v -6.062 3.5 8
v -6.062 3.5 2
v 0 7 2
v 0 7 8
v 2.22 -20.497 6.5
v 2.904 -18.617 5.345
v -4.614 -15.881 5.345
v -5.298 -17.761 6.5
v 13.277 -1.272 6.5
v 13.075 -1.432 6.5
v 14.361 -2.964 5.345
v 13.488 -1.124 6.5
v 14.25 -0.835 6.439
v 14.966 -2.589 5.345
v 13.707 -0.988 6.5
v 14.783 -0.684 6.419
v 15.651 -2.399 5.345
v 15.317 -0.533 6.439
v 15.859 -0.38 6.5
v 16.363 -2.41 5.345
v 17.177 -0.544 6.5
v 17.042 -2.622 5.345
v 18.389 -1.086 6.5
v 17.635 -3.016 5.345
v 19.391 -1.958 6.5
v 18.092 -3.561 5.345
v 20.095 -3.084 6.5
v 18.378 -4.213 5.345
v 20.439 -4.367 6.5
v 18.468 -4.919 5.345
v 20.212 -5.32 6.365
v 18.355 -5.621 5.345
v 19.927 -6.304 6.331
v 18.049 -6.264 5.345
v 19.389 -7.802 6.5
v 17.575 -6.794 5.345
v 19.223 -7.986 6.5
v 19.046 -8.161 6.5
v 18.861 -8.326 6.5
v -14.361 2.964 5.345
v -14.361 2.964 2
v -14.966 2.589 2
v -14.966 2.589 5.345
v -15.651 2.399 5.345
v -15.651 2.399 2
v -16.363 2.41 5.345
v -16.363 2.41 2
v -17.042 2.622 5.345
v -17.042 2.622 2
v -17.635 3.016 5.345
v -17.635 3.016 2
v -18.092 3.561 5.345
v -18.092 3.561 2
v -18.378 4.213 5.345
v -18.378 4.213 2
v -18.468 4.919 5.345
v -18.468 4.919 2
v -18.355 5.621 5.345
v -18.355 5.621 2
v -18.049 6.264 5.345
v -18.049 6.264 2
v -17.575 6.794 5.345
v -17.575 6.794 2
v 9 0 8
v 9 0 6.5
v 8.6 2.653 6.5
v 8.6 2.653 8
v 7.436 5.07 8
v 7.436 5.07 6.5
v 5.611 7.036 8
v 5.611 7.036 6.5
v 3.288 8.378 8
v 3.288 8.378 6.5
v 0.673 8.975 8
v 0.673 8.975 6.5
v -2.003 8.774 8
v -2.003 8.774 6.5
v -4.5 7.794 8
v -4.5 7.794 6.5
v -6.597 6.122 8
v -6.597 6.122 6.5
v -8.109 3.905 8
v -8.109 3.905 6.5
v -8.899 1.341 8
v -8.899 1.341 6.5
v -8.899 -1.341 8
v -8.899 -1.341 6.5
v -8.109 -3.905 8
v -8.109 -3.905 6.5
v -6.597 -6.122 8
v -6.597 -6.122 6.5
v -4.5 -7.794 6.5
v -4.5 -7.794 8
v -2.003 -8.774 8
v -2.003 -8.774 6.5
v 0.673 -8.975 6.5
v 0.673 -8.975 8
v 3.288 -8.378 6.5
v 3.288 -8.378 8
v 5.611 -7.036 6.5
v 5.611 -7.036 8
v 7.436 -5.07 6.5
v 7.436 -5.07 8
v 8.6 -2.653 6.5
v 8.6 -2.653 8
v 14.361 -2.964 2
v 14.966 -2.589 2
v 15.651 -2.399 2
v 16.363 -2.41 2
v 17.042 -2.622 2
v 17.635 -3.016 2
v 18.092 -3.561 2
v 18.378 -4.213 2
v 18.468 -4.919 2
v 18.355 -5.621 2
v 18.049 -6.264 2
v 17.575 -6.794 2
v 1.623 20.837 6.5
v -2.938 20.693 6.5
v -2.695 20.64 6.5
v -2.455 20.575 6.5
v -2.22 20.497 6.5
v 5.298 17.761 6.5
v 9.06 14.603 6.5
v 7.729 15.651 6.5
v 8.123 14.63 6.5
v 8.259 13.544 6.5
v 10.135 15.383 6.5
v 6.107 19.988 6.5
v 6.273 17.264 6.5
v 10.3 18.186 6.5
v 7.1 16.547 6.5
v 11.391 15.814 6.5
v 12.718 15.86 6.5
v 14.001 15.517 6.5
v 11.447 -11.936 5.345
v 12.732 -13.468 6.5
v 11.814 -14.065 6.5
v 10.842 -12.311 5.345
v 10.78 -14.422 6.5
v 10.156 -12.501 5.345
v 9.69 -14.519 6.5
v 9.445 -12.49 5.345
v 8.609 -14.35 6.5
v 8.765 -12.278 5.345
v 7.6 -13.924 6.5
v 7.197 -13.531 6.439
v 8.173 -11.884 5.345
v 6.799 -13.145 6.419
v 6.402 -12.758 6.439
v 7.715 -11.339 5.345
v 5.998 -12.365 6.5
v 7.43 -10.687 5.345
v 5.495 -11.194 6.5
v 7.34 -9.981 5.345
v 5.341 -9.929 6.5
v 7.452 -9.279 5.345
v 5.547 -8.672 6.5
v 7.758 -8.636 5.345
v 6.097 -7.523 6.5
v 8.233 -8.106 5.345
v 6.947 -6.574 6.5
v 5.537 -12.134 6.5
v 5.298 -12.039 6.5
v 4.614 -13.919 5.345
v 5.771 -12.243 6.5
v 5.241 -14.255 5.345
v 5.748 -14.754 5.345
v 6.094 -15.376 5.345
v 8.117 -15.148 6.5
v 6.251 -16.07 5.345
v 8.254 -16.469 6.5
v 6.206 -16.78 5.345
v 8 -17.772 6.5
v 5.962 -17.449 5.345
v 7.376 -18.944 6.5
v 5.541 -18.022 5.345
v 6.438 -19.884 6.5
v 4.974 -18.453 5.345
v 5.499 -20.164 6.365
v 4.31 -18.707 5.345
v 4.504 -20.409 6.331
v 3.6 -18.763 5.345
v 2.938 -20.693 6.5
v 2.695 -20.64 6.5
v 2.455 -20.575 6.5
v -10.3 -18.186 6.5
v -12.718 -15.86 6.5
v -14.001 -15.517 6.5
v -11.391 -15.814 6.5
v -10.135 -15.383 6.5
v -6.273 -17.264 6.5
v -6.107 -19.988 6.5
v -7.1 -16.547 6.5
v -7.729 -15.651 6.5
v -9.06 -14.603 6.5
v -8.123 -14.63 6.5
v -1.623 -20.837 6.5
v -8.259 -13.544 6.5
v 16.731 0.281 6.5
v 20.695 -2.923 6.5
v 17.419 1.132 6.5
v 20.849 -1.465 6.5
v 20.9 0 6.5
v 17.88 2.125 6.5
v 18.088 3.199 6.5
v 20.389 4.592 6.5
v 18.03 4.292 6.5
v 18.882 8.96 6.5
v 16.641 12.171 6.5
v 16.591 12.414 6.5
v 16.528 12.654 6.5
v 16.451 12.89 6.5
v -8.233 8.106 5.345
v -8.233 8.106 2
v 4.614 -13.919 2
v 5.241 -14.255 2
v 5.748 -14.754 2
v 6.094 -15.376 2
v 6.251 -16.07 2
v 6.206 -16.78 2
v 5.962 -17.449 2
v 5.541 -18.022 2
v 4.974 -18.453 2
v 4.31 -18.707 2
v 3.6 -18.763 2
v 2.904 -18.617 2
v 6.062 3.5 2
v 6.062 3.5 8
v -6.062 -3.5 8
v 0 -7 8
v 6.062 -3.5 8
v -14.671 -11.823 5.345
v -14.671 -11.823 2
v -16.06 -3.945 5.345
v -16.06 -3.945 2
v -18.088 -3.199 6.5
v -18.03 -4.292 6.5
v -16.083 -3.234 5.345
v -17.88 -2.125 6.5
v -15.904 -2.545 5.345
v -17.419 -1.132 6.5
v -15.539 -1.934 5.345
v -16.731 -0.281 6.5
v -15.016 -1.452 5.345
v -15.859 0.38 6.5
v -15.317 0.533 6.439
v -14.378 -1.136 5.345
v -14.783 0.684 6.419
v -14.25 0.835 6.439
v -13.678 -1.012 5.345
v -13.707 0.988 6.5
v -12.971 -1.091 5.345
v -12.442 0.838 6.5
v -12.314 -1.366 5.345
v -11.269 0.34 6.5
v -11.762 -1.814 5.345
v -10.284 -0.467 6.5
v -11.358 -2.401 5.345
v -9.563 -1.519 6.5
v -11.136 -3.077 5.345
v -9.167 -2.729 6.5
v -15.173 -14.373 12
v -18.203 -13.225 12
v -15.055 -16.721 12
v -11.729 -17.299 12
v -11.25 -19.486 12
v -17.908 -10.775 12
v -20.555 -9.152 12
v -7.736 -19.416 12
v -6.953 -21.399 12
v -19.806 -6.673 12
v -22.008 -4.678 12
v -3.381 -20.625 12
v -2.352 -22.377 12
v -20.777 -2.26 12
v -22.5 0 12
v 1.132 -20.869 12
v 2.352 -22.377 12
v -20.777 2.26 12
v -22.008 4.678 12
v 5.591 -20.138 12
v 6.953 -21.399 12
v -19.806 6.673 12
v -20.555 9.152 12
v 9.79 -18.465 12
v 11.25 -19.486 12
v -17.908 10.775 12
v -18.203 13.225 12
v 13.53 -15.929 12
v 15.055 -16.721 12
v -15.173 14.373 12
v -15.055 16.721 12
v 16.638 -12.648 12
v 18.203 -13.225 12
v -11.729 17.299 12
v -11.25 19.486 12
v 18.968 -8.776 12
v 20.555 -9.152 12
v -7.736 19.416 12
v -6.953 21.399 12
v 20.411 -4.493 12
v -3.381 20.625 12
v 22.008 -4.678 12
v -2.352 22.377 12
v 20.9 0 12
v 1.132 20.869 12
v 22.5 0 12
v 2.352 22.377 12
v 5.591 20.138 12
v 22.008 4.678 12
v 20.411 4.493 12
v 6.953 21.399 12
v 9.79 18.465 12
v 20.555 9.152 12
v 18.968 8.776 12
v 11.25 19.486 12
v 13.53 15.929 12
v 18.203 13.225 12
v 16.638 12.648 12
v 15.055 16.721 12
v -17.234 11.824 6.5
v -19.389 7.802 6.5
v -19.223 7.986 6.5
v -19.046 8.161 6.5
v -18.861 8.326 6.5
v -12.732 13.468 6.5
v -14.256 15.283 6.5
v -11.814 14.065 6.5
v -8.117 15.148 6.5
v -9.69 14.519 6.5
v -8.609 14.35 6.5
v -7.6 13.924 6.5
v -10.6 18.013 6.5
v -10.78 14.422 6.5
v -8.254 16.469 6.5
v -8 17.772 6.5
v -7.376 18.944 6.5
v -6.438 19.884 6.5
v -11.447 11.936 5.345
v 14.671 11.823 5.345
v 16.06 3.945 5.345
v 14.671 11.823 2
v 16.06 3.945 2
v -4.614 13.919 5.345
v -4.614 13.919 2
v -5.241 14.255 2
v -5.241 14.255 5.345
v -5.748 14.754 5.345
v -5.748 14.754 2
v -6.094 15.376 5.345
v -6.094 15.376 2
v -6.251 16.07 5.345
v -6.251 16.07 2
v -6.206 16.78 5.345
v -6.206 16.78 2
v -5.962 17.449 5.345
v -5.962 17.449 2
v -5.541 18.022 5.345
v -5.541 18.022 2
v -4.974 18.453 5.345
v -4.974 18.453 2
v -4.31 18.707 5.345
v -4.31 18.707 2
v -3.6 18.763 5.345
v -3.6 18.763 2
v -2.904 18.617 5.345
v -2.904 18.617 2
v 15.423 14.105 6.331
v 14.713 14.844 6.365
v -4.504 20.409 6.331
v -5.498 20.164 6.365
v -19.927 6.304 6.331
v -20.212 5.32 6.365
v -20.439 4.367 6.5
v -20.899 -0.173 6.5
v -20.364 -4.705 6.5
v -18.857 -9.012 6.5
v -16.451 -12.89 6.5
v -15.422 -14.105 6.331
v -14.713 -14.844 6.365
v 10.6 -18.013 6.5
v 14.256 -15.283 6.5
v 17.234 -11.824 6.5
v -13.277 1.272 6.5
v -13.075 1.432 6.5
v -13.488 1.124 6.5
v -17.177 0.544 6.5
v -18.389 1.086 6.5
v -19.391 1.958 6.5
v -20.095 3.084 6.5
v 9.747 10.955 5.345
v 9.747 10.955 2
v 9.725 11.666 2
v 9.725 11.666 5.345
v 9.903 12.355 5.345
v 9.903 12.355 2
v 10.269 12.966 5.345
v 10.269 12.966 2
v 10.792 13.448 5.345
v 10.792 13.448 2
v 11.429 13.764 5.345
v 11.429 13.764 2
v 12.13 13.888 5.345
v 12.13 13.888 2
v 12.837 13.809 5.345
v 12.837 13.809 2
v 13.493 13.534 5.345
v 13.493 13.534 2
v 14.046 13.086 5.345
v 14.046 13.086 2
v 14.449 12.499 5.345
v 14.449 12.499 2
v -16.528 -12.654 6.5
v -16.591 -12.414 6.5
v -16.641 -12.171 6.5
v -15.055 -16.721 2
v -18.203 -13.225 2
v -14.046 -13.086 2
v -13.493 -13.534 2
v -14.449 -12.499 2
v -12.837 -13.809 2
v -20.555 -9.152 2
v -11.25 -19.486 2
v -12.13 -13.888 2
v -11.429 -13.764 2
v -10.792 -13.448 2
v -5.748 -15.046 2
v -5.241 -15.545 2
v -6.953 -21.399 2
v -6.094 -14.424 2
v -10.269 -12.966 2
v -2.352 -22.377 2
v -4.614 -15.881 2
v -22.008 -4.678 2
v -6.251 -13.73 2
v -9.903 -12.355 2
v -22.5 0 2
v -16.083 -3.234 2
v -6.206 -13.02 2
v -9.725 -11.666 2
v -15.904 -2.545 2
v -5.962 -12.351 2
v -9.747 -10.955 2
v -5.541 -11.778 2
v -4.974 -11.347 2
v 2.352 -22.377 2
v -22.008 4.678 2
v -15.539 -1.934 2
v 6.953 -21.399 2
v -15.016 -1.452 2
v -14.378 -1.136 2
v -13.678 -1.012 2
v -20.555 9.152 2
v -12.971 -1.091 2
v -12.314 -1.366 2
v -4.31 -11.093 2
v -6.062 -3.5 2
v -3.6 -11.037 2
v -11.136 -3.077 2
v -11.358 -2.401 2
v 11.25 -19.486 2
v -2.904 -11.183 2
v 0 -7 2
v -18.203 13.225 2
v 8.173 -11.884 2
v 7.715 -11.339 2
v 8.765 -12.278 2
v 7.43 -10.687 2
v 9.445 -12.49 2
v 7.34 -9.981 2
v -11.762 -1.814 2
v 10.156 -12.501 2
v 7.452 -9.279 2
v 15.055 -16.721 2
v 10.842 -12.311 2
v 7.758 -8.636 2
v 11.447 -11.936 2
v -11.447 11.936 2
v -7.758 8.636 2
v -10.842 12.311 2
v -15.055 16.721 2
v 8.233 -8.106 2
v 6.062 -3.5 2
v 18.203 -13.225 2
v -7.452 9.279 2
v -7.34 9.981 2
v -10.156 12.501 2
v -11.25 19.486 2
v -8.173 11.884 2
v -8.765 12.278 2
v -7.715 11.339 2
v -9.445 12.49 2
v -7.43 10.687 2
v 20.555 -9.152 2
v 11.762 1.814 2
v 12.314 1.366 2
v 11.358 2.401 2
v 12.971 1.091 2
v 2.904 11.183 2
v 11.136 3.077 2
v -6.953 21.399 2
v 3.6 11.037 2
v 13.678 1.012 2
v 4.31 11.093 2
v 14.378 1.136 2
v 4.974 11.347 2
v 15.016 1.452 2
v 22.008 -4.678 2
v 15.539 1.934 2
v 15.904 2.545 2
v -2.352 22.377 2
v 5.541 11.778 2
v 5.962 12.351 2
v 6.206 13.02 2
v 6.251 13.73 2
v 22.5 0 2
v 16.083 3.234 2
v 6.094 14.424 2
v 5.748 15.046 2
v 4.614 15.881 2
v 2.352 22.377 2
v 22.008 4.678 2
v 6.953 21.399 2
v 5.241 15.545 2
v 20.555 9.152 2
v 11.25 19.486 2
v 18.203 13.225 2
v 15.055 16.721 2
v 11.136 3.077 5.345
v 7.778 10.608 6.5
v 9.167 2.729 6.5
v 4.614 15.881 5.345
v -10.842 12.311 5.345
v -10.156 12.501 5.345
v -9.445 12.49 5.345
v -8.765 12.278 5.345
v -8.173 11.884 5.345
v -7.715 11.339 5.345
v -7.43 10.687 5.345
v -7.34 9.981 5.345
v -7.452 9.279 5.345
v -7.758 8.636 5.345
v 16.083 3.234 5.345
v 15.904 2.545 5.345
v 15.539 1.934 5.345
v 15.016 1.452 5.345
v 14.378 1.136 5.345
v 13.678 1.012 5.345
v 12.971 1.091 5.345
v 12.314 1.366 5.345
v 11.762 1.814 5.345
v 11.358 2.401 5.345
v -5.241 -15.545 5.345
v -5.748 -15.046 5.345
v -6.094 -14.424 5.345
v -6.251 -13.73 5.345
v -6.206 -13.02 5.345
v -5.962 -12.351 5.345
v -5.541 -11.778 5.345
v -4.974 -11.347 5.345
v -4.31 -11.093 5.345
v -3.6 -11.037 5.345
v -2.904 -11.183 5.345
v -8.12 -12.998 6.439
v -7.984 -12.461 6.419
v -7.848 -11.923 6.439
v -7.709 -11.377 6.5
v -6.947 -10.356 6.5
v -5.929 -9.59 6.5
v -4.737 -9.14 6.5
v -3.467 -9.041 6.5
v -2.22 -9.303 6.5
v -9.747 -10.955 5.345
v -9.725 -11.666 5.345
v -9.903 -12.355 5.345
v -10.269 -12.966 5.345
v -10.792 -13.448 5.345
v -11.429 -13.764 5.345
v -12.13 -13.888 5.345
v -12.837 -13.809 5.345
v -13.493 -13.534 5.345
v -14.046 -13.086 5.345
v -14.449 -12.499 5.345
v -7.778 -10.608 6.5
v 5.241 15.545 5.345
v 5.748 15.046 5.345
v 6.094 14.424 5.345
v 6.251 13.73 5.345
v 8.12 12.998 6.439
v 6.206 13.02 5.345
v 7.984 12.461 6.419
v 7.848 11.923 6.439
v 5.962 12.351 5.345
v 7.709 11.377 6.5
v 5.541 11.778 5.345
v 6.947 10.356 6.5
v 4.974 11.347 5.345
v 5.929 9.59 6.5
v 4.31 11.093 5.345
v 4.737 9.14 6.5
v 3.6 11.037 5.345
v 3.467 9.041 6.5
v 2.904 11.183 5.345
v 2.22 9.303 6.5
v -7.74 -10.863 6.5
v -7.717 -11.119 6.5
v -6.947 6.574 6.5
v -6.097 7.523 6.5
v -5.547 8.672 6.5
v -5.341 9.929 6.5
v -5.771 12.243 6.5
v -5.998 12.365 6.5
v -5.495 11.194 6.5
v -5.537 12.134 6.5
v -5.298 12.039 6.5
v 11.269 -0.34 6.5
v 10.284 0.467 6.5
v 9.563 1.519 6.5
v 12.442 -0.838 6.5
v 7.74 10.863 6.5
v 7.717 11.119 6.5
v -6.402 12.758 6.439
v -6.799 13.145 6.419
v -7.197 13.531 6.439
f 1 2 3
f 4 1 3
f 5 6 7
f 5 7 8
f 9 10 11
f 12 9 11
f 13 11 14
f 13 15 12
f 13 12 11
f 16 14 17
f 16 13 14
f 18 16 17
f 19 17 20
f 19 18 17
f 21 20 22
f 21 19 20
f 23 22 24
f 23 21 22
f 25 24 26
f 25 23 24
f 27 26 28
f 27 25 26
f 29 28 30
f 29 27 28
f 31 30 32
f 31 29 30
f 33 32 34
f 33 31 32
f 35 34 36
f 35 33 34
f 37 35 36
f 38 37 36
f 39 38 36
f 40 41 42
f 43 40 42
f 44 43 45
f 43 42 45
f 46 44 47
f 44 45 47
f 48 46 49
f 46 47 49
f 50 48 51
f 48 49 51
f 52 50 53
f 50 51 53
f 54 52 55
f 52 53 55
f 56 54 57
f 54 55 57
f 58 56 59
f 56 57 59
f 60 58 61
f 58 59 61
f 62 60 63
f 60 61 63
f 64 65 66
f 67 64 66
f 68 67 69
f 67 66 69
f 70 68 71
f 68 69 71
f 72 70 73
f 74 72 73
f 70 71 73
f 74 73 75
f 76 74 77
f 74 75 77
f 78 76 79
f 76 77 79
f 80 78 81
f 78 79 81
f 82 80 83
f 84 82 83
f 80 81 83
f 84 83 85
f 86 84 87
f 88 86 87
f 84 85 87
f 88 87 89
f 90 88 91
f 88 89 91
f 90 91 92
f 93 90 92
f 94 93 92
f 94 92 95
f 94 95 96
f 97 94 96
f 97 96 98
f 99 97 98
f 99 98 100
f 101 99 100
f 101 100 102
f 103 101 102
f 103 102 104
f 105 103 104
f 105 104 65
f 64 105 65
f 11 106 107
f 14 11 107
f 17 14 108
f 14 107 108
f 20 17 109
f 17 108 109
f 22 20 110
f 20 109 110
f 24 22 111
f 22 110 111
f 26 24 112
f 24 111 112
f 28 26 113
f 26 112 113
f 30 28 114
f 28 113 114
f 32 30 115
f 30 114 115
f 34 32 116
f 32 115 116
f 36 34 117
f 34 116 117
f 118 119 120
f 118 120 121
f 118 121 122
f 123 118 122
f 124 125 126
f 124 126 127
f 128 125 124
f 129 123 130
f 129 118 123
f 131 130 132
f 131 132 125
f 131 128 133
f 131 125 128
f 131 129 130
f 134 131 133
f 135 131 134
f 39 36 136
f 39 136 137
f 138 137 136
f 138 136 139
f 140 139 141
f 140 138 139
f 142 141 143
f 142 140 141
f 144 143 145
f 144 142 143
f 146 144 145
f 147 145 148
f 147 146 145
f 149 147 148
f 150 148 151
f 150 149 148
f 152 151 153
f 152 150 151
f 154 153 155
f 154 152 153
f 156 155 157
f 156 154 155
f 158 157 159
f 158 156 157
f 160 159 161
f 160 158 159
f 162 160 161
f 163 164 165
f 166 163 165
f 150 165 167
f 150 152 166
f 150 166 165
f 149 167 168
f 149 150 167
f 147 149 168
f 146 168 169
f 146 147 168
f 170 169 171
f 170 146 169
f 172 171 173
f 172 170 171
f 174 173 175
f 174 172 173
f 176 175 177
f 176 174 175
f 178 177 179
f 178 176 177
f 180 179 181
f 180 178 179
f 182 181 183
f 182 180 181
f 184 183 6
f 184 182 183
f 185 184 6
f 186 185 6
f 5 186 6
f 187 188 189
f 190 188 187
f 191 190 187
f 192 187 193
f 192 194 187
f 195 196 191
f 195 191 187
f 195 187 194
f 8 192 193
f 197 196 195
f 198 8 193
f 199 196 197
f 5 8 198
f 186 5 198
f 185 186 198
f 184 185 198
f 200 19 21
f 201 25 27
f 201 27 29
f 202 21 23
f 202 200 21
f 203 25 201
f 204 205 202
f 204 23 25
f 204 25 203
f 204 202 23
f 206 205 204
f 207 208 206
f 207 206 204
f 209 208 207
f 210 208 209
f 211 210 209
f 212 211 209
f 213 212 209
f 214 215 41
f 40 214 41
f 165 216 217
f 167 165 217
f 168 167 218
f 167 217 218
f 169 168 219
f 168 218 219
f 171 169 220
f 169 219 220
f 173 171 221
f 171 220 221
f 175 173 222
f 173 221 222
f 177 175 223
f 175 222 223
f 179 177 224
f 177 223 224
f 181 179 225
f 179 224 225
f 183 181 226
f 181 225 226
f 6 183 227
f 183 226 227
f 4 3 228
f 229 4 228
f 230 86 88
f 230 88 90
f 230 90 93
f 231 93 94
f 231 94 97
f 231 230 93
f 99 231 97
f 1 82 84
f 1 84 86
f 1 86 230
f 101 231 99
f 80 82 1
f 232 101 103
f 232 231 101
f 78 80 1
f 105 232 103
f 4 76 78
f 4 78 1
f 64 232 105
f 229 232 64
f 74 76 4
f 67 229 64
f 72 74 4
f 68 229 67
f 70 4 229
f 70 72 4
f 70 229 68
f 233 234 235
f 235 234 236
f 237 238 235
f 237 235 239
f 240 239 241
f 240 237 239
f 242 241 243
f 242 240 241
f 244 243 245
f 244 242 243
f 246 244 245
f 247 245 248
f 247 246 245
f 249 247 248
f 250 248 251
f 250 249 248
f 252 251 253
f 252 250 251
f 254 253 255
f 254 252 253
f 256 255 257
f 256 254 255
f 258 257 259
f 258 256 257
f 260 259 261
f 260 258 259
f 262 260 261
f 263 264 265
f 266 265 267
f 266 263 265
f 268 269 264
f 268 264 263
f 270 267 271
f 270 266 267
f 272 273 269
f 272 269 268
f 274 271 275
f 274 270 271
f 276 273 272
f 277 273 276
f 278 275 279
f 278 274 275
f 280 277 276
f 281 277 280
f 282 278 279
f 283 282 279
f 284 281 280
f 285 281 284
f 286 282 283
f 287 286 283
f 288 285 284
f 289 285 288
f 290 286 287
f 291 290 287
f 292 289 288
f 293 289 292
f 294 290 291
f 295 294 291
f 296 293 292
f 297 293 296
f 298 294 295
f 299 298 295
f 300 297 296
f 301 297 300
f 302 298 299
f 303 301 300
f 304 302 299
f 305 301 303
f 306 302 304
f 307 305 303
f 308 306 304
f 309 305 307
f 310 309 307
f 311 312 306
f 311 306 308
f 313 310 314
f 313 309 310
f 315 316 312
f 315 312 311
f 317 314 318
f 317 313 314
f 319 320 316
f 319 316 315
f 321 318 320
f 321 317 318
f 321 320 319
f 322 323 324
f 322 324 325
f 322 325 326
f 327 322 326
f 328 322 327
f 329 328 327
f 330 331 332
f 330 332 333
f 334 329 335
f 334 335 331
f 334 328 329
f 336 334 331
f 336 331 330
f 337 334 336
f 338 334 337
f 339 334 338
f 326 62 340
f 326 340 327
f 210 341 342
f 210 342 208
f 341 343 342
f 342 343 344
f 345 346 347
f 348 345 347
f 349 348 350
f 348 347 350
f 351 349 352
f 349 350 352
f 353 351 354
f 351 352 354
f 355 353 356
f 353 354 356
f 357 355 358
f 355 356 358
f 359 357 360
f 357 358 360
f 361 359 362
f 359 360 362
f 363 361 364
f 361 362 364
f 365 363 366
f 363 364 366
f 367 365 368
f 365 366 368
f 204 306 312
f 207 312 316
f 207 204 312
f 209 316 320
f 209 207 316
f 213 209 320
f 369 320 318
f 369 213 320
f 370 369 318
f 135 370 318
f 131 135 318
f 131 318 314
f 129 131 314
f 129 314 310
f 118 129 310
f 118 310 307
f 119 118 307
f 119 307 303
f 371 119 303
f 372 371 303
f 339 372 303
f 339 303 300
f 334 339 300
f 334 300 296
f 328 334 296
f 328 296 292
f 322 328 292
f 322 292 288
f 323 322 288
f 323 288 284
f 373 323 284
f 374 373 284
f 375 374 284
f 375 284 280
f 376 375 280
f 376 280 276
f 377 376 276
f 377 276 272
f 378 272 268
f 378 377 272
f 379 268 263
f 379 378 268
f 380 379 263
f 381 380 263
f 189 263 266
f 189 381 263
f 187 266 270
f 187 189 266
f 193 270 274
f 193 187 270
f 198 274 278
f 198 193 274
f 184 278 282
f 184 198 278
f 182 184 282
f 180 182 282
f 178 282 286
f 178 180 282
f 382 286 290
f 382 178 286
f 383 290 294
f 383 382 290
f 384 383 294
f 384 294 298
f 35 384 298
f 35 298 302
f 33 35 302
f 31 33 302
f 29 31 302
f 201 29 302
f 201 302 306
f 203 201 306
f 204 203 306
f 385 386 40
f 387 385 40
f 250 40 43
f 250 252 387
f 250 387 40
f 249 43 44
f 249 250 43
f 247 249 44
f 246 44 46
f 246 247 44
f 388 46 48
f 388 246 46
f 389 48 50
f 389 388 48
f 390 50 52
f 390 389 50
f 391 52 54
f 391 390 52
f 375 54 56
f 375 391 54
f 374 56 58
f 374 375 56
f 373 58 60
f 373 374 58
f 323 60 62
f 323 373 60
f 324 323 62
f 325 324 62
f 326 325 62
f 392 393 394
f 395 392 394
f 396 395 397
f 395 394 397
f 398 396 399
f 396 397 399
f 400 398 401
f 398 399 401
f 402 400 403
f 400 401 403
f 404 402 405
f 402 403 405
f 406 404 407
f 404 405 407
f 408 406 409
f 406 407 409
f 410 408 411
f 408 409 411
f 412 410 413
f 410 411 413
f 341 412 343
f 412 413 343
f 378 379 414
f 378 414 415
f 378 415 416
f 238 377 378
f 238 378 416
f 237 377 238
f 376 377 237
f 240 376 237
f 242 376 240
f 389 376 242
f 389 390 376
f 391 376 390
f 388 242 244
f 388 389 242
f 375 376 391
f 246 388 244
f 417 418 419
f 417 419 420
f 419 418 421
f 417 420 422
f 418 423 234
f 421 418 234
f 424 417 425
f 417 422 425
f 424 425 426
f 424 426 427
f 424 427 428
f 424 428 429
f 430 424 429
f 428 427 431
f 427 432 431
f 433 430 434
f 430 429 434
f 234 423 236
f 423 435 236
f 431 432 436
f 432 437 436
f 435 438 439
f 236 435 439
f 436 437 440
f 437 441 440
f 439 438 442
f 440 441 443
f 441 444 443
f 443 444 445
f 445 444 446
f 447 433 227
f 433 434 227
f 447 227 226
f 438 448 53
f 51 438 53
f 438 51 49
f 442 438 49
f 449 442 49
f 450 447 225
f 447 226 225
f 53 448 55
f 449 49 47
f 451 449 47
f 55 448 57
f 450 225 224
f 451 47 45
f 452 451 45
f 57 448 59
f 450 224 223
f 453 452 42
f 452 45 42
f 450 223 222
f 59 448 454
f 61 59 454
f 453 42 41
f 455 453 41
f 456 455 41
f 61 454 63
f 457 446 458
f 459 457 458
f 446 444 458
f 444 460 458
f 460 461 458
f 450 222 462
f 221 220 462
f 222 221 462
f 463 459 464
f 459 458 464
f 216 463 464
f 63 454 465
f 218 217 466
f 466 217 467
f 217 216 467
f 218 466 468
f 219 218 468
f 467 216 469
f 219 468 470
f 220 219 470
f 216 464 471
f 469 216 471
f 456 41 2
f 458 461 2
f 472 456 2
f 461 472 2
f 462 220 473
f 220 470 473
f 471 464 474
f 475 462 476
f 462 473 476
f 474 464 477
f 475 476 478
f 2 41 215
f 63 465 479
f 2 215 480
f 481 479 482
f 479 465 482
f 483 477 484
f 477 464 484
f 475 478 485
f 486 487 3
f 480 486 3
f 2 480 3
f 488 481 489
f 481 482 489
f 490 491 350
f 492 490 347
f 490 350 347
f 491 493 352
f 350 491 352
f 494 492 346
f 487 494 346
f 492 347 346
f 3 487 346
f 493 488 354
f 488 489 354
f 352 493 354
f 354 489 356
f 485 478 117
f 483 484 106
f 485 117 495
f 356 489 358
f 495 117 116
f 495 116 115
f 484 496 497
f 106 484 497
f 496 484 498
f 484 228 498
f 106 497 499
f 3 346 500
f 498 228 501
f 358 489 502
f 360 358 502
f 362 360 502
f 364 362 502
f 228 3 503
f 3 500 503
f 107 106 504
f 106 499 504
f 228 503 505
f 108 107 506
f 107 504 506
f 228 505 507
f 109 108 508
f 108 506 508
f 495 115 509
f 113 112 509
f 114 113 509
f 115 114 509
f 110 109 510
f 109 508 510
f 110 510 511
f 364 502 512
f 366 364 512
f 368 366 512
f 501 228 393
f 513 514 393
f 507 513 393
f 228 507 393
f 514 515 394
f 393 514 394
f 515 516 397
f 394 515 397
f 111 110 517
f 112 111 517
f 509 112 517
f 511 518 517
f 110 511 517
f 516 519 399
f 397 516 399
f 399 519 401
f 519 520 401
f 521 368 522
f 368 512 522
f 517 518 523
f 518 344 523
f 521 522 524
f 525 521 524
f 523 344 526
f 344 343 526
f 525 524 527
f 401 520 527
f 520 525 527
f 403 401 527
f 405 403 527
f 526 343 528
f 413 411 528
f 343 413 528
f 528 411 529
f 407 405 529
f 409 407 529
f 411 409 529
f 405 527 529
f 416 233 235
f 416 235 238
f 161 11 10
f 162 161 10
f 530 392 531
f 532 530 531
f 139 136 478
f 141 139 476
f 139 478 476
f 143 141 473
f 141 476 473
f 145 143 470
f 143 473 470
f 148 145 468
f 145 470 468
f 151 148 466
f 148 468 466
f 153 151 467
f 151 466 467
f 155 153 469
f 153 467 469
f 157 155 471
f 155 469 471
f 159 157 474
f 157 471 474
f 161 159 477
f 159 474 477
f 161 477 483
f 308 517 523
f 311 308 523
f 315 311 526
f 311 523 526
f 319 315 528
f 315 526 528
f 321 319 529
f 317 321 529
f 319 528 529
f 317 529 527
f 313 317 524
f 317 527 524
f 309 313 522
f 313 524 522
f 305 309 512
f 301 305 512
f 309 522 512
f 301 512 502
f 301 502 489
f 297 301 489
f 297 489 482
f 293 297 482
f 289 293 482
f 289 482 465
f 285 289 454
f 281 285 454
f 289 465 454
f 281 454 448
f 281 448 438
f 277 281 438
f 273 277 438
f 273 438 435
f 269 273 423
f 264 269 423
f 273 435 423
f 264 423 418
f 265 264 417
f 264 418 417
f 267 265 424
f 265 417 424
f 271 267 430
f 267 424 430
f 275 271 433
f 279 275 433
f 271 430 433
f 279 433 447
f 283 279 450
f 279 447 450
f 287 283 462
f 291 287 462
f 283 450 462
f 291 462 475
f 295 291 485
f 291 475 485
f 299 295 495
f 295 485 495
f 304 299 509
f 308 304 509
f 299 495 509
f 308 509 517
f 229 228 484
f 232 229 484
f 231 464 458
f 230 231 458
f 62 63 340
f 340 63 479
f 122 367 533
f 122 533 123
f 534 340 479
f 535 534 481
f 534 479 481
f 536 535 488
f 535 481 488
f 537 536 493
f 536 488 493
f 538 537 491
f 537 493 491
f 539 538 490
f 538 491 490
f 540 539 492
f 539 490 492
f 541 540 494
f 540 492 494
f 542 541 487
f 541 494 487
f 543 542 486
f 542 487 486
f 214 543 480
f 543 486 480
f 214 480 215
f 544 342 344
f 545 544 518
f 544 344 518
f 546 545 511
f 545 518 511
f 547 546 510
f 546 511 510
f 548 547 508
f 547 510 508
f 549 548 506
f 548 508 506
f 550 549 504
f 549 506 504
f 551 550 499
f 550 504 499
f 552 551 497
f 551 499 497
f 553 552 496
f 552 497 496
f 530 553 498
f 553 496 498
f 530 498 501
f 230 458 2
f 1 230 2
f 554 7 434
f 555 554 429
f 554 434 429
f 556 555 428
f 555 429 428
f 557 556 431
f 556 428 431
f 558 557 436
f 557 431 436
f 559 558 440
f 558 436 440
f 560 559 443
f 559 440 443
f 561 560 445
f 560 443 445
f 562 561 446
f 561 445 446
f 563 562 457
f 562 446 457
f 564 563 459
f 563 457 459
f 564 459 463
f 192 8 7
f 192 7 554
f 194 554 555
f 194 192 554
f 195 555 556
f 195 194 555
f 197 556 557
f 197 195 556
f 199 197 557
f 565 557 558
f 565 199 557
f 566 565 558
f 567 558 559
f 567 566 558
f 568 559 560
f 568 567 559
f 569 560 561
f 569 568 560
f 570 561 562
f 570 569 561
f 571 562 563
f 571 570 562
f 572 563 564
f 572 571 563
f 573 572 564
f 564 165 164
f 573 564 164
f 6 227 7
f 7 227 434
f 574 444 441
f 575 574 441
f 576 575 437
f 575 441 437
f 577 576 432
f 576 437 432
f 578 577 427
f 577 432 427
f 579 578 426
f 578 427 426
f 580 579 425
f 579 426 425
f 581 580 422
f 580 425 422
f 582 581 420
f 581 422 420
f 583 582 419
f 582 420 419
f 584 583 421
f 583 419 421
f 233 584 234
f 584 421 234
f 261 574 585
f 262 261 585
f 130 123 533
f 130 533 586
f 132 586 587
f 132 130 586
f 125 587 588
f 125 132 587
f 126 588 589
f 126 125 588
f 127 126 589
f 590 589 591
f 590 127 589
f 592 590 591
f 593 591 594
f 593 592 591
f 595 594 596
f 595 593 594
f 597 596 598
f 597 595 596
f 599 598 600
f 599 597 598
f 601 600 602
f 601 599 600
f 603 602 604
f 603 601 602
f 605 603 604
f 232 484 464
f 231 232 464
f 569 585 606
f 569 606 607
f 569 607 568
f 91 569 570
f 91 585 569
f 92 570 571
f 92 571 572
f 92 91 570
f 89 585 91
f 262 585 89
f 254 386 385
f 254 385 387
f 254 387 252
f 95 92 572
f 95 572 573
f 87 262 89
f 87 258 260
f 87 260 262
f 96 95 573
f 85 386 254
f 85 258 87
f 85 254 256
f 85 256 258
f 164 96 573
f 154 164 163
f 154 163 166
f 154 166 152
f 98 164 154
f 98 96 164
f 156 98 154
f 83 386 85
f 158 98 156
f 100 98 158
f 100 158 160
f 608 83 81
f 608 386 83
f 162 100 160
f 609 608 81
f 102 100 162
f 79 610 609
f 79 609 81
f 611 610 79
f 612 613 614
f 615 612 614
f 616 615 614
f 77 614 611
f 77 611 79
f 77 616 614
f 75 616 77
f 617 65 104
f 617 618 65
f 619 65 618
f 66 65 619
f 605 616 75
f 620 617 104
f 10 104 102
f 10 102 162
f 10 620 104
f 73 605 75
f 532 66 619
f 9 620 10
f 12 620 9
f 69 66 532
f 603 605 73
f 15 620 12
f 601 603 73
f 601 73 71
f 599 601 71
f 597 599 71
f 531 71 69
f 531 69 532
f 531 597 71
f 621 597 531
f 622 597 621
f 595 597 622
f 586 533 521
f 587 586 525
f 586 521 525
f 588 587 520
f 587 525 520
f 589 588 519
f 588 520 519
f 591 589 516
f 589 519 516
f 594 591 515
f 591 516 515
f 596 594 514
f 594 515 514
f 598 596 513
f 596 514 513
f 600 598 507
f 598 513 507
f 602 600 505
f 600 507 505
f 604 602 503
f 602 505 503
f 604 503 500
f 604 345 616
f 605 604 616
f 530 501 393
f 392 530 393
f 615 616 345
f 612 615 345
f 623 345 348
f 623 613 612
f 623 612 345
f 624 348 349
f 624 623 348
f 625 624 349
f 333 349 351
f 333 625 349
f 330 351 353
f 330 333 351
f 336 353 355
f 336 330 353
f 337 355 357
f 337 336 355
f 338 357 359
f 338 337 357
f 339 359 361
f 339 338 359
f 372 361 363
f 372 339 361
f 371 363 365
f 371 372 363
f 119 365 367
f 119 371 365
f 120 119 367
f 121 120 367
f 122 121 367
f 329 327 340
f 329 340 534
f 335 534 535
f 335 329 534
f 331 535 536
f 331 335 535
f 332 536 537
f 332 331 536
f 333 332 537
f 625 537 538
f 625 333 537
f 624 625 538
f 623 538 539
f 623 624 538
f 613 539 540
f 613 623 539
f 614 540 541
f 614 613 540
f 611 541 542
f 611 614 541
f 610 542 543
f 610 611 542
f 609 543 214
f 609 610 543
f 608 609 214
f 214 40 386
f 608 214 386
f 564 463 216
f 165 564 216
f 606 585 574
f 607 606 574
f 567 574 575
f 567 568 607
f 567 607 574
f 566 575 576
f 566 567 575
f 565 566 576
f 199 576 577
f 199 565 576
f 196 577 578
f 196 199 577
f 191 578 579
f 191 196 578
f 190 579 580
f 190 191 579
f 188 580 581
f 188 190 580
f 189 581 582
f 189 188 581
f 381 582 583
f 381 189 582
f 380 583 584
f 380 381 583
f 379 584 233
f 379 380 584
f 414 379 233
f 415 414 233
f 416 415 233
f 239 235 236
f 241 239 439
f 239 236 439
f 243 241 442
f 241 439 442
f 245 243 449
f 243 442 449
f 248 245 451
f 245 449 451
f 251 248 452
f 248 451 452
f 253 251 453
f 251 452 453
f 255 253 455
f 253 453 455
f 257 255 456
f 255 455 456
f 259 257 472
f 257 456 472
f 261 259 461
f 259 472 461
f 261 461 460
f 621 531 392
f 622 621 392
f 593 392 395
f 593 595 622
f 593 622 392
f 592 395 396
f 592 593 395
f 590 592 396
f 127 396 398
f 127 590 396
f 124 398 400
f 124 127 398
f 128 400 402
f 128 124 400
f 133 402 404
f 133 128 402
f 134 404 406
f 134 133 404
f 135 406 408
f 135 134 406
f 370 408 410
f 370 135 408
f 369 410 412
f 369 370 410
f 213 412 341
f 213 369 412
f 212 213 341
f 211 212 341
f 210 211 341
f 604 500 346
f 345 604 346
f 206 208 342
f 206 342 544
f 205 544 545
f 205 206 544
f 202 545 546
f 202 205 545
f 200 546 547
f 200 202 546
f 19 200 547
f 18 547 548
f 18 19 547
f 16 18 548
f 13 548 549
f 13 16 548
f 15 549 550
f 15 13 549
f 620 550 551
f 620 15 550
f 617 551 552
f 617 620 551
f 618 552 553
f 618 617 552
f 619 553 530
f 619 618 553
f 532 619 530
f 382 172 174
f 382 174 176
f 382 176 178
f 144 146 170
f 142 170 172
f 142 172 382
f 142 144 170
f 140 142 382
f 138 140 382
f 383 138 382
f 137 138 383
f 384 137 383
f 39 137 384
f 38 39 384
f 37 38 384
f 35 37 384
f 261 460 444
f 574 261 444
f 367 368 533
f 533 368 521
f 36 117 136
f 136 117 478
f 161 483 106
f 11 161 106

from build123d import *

# Parameters (mm, degrees)
F1_START     = 2
F0_R         = 20.9
F0_R_2       = 9
F1_DEPTH     = 4.5
F2_START     = 2
F0_R_3       = 8
F2_DEPTH     = 6
F3_START     = 2
F3_DEPTH     = 6
F4_START     = 2
F0_R_4       = 22.5
F4_DEPTH     = 10
F5_T1_DEPTH  = 8
F5_T3_DEPTH  = 8
F5_T5_DEPTH  = 8
F5_T7_DEPTH  = 8
F5_T9_DEPTH  = 8
F5_T11_DEPTH = 8
F5_T13_DEPTH = 8
F5_T15_DEPTH = 8
F5_T17_DEPTH = 8
F5_T19_DEPTH = 8
F5_T21_DEPTH = 8
F5_T23_DEPTH = 8
F5_T26_ANGLE = 180
F5_T30_ANGLE = 180
F5_S31_R     = 20.9
F5_T32_DEPTH = 7
F5_T34_ANGLE = 180
F5_T38_ANGLE = 180
F5_S39_R     = 20.9
F5_T40_DEPTH = 7
F5_T44_ANGLE = 180
F5_S45_R     = 20.9
F5_T46_DEPTH = 7
F5_T48_ANGLE = 180
F5_T52_ANGLE = 180
F5_S53_R     = 20.9
F5_T54_DEPTH = 7
F5_T56_ANGLE = 180
F5_T60_ANGLE = 180
F5_S61_R     = 20.9
F5_T62_DEPTH = 7
F5_T64_ANGLE = 180
F5_T66_ANGLE = 180
F5_T70_ANGLE = 180
F5_S71_R     = 20.9
F5_T72_DEPTH = 7


# Not quite as in the source:
# - a fillet or chamfer that OpenCascade refuses, or shapes differently, is made with other operations: its cross-section is extruded or revolved along the edge and cut away or added
# - a feature names something its author has since deleted; it is built from what else it names


with BuildPart() as f1:
    # F0 (on Top) → F1 (new body)
    with BuildSketch(Plane.XY.offset(F1_START)):
        Circle(F0_R)
        with BuildLine():
            ThreePointArc((4.6138208415, -13.9188490213), (6.1080020351, -17.1231309316), (2.9037201248, -18.6173121253))
            Line((2.9037201248, -18.6173121253), (-4.6138208415, -15.8811509787))
            ThreePointArc((-4.6138208415, -15.8811509787), (-6.1080020351, -12.6768690684), (-2.9037201248, -11.1826878747))
            Line((-2.9037201248, -11.1826878747), (4.6138208415, -13.9188490213))
        make_face(mode=Mode.SUBTRACT)
        with BuildLine():
            ThreePointArc((-9.7471664232, -10.9551105679), (-11.7750653616, -13.8512503946), (-14.6712051883, -11.8233514562))
            Line((-14.6712051883, -11.8233514562), (-16.0603906096, -3.9448894321))
            ThreePointArc((-16.0603906096, -3.9448894321), (-14.0324916712, -1.0487496054), (-11.1363518445, -3.0766485438))
            Line((-11.1363518445, -3.0766485438), (-9.7471664232, -10.9551105679))
        make_face(mode=Mode.SUBTRACT)
        with BuildLine():
            ThreePointArc((14.3609872646, -2.9637384535), (17.8830673967, -3.271880537), (17.5749253131, -6.7939606691))
            Line((17.5749253131, -6.7939606691), (11.4465697681, -11.9362615465))
            ThreePointArc((11.4465697681, -11.9362615465), (7.9244896361, -11.628119463), (8.2326317197, -8.1060393309))
            Line((8.2326317197, -8.1060393309), (14.3609872646, -2.9637384535))
        make_face(mode=Mode.SUBTRACT)
        with BuildLine():
            ThreePointArc((-14.3609872646, 2.9637384535), (-17.8830673967, 3.271880537), (-17.5749253131, 6.7939606691))
            Line((-17.5749253131, 6.7939606691), (-11.4465697681, 11.9362615465))
            ThreePointArc((-11.4465697681, 11.9362615465), (-7.9244896361, 11.628119463), (-8.2326317197, 8.1060393309))
            Line((-8.2326317197, 8.1060393309), (-14.3609872646, 2.9637384535))
        make_face(mode=Mode.SUBTRACT)
        Circle(F0_R_2, mode=Mode.SUBTRACT)
        with BuildLine():
            ThreePointArc((9.7471664232, 10.9551105679), (11.7750653616, 13.8512503946), (14.6712051883, 11.8233514562))
            Line((14.6712051883, 11.8233514562), (16.0603906096, 3.9448894321))
            ThreePointArc((16.0603906096, 3.9448894321), (14.0324916712, 1.0487496054), (11.1363518445, 3.0766485438))
            Line((11.1363518445, 3.0766485438), (9.7471664232, 10.9551105679))
        make_face(mode=Mode.SUBTRACT)
        with BuildLine():
            ThreePointArc((-4.6138208415, 13.9188490213), (-6.1080020351, 17.1231309316), (-2.9037201248, 18.6173121253))
            Line((-2.9037201248, 18.6173121253), (4.6138208415, 15.8811509787))
            ThreePointArc((4.6138208415, 15.8811509787), (6.1080020351, 12.6768690684), (2.9037201248, 11.1826878747))
            Line((2.9037201248, 11.1826878747), (-4.6138208415, 13.9188490213))
        make_face(mode=Mode.SUBTRACT)
    extrude(amount=F1_DEPTH)

    # F0 (on Top) → F2 (join)
    with BuildSketch(Plane.XY.offset(F2_START)):
        Circle(F0_R_2)
        Circle(F0_R_3, mode=Mode.SUBTRACT)
    extrude(amount=F2_DEPTH)

    # F0 (on Top) → F3 (join)
    with BuildSketch(Plane.XY.offset(F3_START)):
        Circle(F0_R_3)
        with BuildLine():
            ThreePointArc((6.0621778265, 3.5), (6.761480784, 1.8117333157), (7, 0))
            ThreePointArc((7, 0), (6.761480784, -1.8117333157), (6.0621778265, -3.5))
            ThreePointArc((6.0621778265, -3.5), (3.5, -6.0621778265), (0, -7))
            ThreePointArc((0, -7), (-3.5, -6.0621778265), (-6.0621778265, -3.5))
            ThreePointArc((-6.0621778265, -3.5), (-7, 0), (-6.0621778265, 3.5))
            ThreePointArc((-6.0621778265, 3.5), (-3.5, 6.0621778265), (0, 7))
            ThreePointArc((0, 7), (3.5, 6.0621778265), (6.0621778265, 3.5))
        make_face(mode=Mode.SUBTRACT)
        with BuildLine():
            Line((-6.0621778265, -3.5), (-6.0621778265, 3.5))
            ThreePointArc((-6.0621778265, 3.5), (-7, 0), (-6.0621778265, -3.5))
        make_face()
        with BuildLine():
            Line((-6.0621778265, 3.5), (0, 7))
            ThreePointArc((0, 7), (-3.5, 6.0621778265), (-6.0621778265, 3.5))
        make_face()
        with BuildLine():
            Line((0, 7), (6.0621778265, 3.5))
            ThreePointArc((6.0621778265, 3.5), (3.5, 6.0621778265), (0, 7))
        make_face()
        with BuildLine():
            ThreePointArc((6.0621778265, -3.5), (6.761480784, -1.8117333157), (7, 0))
            ThreePointArc((7, 0), (6.761480784, 1.8117333157), (6.0621778265, 3.5))
            Line((6.0621778265, 3.5), (6.0621778265, -3.5))
        make_face()
        with BuildLine():
            ThreePointArc((0, -7), (3.5, -6.0621778265), (6.0621778265, -3.5))
            Line((6.0621778265, -3.5), (0, -7))
        make_face()
        with BuildLine():
            ThreePointArc((-6.0621778265, -3.5), (-3.5, -6.0621778265), (0, -7))
            Line((0, -7), (-6.0621778265, -3.5))
        make_face()
    extrude(amount=F3_DEPTH)

    # F0 (on Top) → F4 (join)
    with BuildSketch(Plane.XY.offset(F4_START)):
        Circle(F0_R_4)
        Circle(F0_R, mode=Mode.SUBTRACT)
    extrude(amount=F4_DEPTH)

    # F5: chamfer of 2 x 1.1547005384 on 24 edges, made by hand

    # F5_s2 → F5_t1 (cut)
    with BuildSketch(Plane(origin=(1.029997209, -0.3748883255, 0), x_dir=(0, 0, 1), z_dir=(0.9396926208, -0.3420201433, 0))):
        Polygon((5.3452994616, 11.5014200497), (6.5, 9.5014200497), (6.5, 11.5014200497), align=None)
    extrude(amount=F5_T1_DEPTH, mode=Mode.SUBTRACT)

    # F5_s4 → F5_t3 (cut)
    with BuildSketch(Plane(origin=(-1.029997209, 0.3748883255, 0), x_dir=(0, 0, 1), z_dir=(-0.9396926208, 0.3420201433, 0))):
        Polygon((5.3452994616, 11.5014200497), (6.5, 9.5014200497), (6.5, 11.5014200497), align=None)
    extrude(amount=F5_T3_DEPTH, mode=Mode.SUBTRACT)

    # F5_s6 → F5_t5 (cut)
    with BuildSketch(Plane(origin=(-0.1903357911, 1.0794479116, 0), x_dir=(0, 0, 1), z_dir=(-0.1736481777, 0.984807753, 0))):
        Polygon((5.3452994616, 11.5014200497), (6.5, 9.5014200497), (6.5, 11.5014200497), align=None)
    extrude(amount=F5_T5_DEPTH, mode=Mode.SUBTRACT)

    # F5_s8 → F5_t7 (cut)
    with BuildSketch(Plane(origin=(0.8396614179, 0.7045595861, 0), x_dir=(0, 0, 1), z_dir=(0.7660444431, 0.6427876097, 0))):
        Polygon((5.3452994616, 11.5014200497), (6.5, 9.5014200497), (6.5, 11.5014200497), align=None)
    extrude(amount=F5_T7_DEPTH, mode=Mode.SUBTRACT)

    # F5_s10 → F5_t9 (cut)
    with BuildSketch(Plane(origin=(-0.8396614179, -0.7045595861, 0), x_dir=(0, 0, 1), z_dir=(-0.7660444431, -0.6427876097, 0))):
        Polygon((5.3452994616, 11.5014200497), (6.5, 9.5014200497), (6.5, 11.5014200497), align=None)
    extrude(amount=F5_T9_DEPTH, mode=Mode.SUBTRACT)

    # F5_s12 → F5_t11 (cut)
    with BuildSketch(Plane(origin=(0.1903357911, -1.0794479116, 0), x_dir=(0, 0, 1), z_dir=(0.1736481777, -0.984807753, 0))):
        Polygon((5.3452994616, 11.5014200497), (6.5, 9.5014200497), (6.5, 11.5014200497), align=None)
    extrude(amount=F5_T11_DEPTH, mode=Mode.SUBTRACT)

    # F5_s14 → F5_t13 (cut)
    with BuildSketch(Plane(origin=(8.5475381753, -3.1110494721, 0), x_dir=(0, 0, 1), z_dir=(-0.9396926208, 0.3420201433, 0))):
        Polygon((5.3452994616, -16.5014200497), (6.5, -18.5014200497), (6.5, -16.5014200497), align=None)
    extrude(amount=F5_T13_DEPTH, mode=Mode.SUBTRACT)

    # F5_s16 → F5_t15 (cut)
    with BuildSketch(Plane(origin=(1.5795212124, -8.9579099357, 0), x_dir=(0, 0, 1), z_dir=(-0.1736481777, 0.984807753, 0))):
        Polygon((5.3452994616, -16.5014200497), (6.5, -18.5014200497), (6.5, -16.5014200497), align=None)
    extrude(amount=F5_T15_DEPTH, mode=Mode.SUBTRACT)

    # F5_s18 → F5_t17 (cut)
    with BuildSketch(Plane(origin=(6.9680169629, 5.8468604636, 0), x_dir=(0, 0, 1), z_dir=(-0.7660444431, -0.6427876097, 0))):
        Polygon((5.3452994616, -16.5014200497), (6.5, -18.5014200497), (6.5, -16.5014200497), align=None)
    extrude(amount=F5_T17_DEPTH, mode=Mode.SUBTRACT)

    # F5_s20 → F5_t19 (cut)
    with BuildSketch(Plane(origin=(-6.9680169629, -5.8468604636, 0), x_dir=(0, 0, 1), z_dir=(0.7660444431, 0.6427876097, 0))):
        Polygon((5.3452994616, -16.5014200497), (6.5, -18.5014200497), (6.5, -16.5014200497), align=None)
    extrude(amount=F5_T19_DEPTH, mode=Mode.SUBTRACT)

    # F5_s22 → F5_t21 (cut)
    with BuildSketch(Plane(origin=(-1.5795212124, 8.9579099357, 0), x_dir=(0, 0, 1), z_dir=(0.1736481777, -0.984807753, 0))):
        Polygon((5.3452994616, -16.5014200497), (6.5, -18.5014200497), (6.5, -16.5014200497), align=None)
    extrude(amount=F5_T21_DEPTH, mode=Mode.SUBTRACT)

    # F5_s24 → F5_t23 (cut)
    with BuildSketch(Plane(origin=(-8.5475381753, 3.1110494721, 0), x_dir=(0, 0, 1), z_dir=(0.9396926208, -0.3420201433, 0))):
        Polygon((5.3452994616, -16.5014200497), (6.5, -18.5014200497), (6.5, -16.5014200497), align=None)
    extrude(amount=F5_T23_DEPTH, mode=Mode.SUBTRACT)

    # F5_s25 → F5_t26 (revolve, cut)
    with BuildSketch(Plane(origin=(1.029997209, -0.3748883255, 0), x_dir=(0, 0, 1), z_dir=(0.9396926208, -0.3420201433, 0))):
        Polygon((5.3452994616, 16.5014200497), (6.5, 18.5014200497), (6.5, 16.5014200497), align=None)
    revolve(axis=Axis((-3.7587704831, -13.5319194267, 6.5), (0, 0, -1)), revolution_arc=F5_T26_ANGLE, mode=Mode.SUBTRACT)


with BuildPart() as f5_tool28:
    # F5_s29 → F5_t30 (revolve)
    with BuildSketch(Plane(origin=(8.5475381753, -3.1110494721, 0), x_dir=(0, 0, 1), z_dir=(-0.9396926208, 0.3420201433, 0))):
        Polygon((5.3452994616, -11.5014200497), (6.5, -9.5014200497), (6.5, -11.5014200497), align=None)
    revolve(axis=Axis((3.7587704831, -16.2680805733, 6.5), (0, 0, -1)), revolution_arc=F5_T30_ANGLE)

    # F5_s31 → F5_t32 (intersect, symmetric)
    with BuildSketch(Plane.XY.offset(5.9)):
        Circle(F5_S31_R)
    extrude(amount=F5_T32_DEPTH, both=True, mode=Mode.INTERSECT)


with BuildPart() as f1_1:
    add(f1.part)

    # F5_t27: cut F5_tool28
    add(f5_tool28.part, mode=Mode.SUBTRACT)

    # F5_s33 → F5_t34 (revolve, cut)
    with BuildSketch(Plane(origin=(0.1903357911, -1.0794479116, 0), x_dir=(0, 0, 1), z_dir=(0.1736481777, -0.984807753, 0))):
        Polygon((5.3452994616, 16.5014200497), (6.5, 18.5014200497), (6.5, 16.5014200497), align=None)
    revolve(axis=Axis((-13.5983712271, -3.510768988, 6.5), (0, 0, -1)), revolution_arc=F5_T34_ANGLE, mode=Mode.SUBTRACT)


with BuildPart() as f5_tool36:
    # F5_s37 → F5_t38 (revolve)
    with BuildSketch(Plane(origin=(1.5795212124, -8.9579099357, 0), x_dir=(0, 0, 1), z_dir=(-0.1736481777, 0.984807753, 0))):
        Polygon((5.3452994616, -11.5014200497), (6.5, -9.5014200497), (6.5, -11.5014200497), align=None)
    revolve(axis=Axis((-12.2091858057, -11.389231012, 6.5), (0, 0, -1)), revolution_arc=F5_T38_ANGLE)

    # F5_s39 → F5_t40 (intersect, symmetric)
    with BuildSketch(Plane.XY.offset(5.9)):
        Circle(F5_S39_R)
    extrude(amount=F5_T40_DEPTH, both=True, mode=Mode.INTERSECT)


with BuildPart() as f1_2:
    add(f1_1.part)

    # F5_t35: cut F5_tool36
    add(f5_tool36.part, mode=Mode.SUBTRACT)


with BuildPart() as f5_tool42:
    # F5_s43 → F5_t44 (revolve)
    with BuildSketch(Plane(origin=(6.9680169629, 5.8468604636, 0), x_dir=(0, 0, 1), z_dir=(-0.7660444431, -0.6427876097, 0))):
        Polygon((5.3452994616, -11.5014200497), (6.5, -9.5014200497), (6.5, -11.5014200497), align=None)
    revolve(axis=Axis((15.9679562889, -4.8788495613, 6.5), (0, 0, -1)), revolution_arc=F5_T44_ANGLE)

    # F5_s45 → F5_t46 (intersect, symmetric)
    with BuildSketch(Plane.XY.offset(5.9)):
        Circle(F5_S45_R)
    extrude(amount=F5_T46_DEPTH, both=True, mode=Mode.INTERSECT)


with BuildPart() as f1_3:
    add(f1_2.part)

    # F5_t41: cut F5_tool42
    add(f5_tool42.part, mode=Mode.SUBTRACT)

    # F5_s47 → F5_t48 (revolve, cut)
    with BuildSketch(Plane(origin=(0.8396614179, 0.7045595861, 0), x_dir=(0, 0, 1), z_dir=(0.7660444431, 0.6427876097, 0))):
        Polygon((5.3452994616, 16.5014200497), (6.5, 18.5014200497), (6.5, 16.5014200497), align=None)
    revolve(axis=Axis((9.8396007439, -10.0211504387, 6.5), (0, 0, -1)), revolution_arc=F5_T48_ANGLE, mode=Mode.SUBTRACT)


with BuildPart() as f5_tool50:
    # F5_s51 → F5_t52 (revolve)
    with BuildSketch(Plane(origin=(-6.9680169629, -5.8468604636, 0), x_dir=(0, 0, 1), z_dir=(0.7660444431, 0.6427876097, 0))):
        Polygon((5.3452994616, -11.5014200497), (6.5, -9.5014200497), (6.5, -11.5014200497), align=None)
    revolve(axis=Axis((-15.9679562889, 4.8788495613, 6.5), (0, 0, -1)), revolution_arc=F5_T52_ANGLE)

    # F5_s53 → F5_t54 (intersect, symmetric)
    with BuildSketch(Plane.XY.offset(5.9)):
        Circle(F5_S53_R)
    extrude(amount=F5_T54_DEPTH, both=True, mode=Mode.INTERSECT)


with BuildPart() as f1_4:
    add(f1_3.part)

    # F5_t49: cut F5_tool50
    add(f5_tool50.part, mode=Mode.SUBTRACT)

    # F5_s55 → F5_t56 (revolve, cut)
    with BuildSketch(Plane(origin=(-0.8396614179, -0.7045595861, 0), x_dir=(0, 0, 1), z_dir=(-0.7660444431, -0.6427876097, 0))):
        Polygon((5.3452994616, 16.5014200497), (6.5, 18.5014200497), (6.5, 16.5014200497), align=None)
    revolve(axis=Axis((-9.8396007439, 10.0211504387, 6.5), (0, 0, -1)), revolution_arc=F5_T56_ANGLE, mode=Mode.SUBTRACT)


with BuildPart() as f5_tool58:
    # F5_s59 → F5_t60 (revolve)
    with BuildSketch(Plane(origin=(-1.5795212124, 8.9579099357, 0), x_dir=(0, 0, 1), z_dir=(0.1736481777, -0.984807753, 0))):
        Polygon((5.3452994616, -11.5014200497), (6.5, -9.5014200497), (6.5, -11.5014200497), align=None)
    revolve(axis=Axis((12.2091858057, 11.389231012, 6.5), (0, 0, -1)), revolution_arc=F5_T60_ANGLE)

    # F5_s61 → F5_t62 (intersect, symmetric)
    with BuildSketch(Plane.XY.offset(5.9)):
        Circle(F5_S61_R)
    extrude(amount=F5_T62_DEPTH, both=True, mode=Mode.INTERSECT)


with BuildPart() as f1_5:
    add(f1_4.part)

    # F5_t57: cut F5_tool58
    add(f5_tool58.part, mode=Mode.SUBTRACT)

    # F5_s63 → F5_t64 (revolve, cut)
    with BuildSketch(Plane(origin=(-0.1903357911, 1.0794479116, 0), x_dir=(0, 0, 1), z_dir=(-0.1736481777, 0.984807753, 0))):
        Polygon((5.3452994616, 16.5014200497), (6.5, 18.5014200497), (6.5, 16.5014200497), align=None)
    revolve(axis=Axis((13.5983712271, 3.510768988, 6.5), (0, 0, -1)), revolution_arc=F5_T64_ANGLE, mode=Mode.SUBTRACT)

    # F5_s65 → F5_t66 (revolve, cut)
    with BuildSketch(Plane(origin=(-1.029997209, 0.3748883255, 0), x_dir=(0, 0, 1), z_dir=(-0.9396926208, 0.3420201433, 0))):
        Polygon((5.3452994616, 16.5014200497), (6.5, 18.5014200497), (6.5, 16.5014200497), align=None)
    revolve(axis=Axis((3.7587704831, 13.5319194267, 6.5), (0, 0, -1)), revolution_arc=F5_T66_ANGLE, mode=Mode.SUBTRACT)


with BuildPart() as f5_tool68:
    # F5_s69 → F5_t70 (revolve)
    with BuildSketch(Plane(origin=(-8.5475381753, 3.1110494721, 0), x_dir=(0, 0, 1), z_dir=(0.9396926208, -0.3420201433, 0))):
        Polygon((5.3452994616, -11.5014200497), (6.5, -9.5014200497), (6.5, -11.5014200497), align=None)
    revolve(axis=Axis((-3.7587704831, 16.2680805733, 6.5), (0, 0, -1)), revolution_arc=F5_T70_ANGLE)

    # F5_s71 → F5_t72 (intersect, symmetric)
    with BuildSketch(Plane.XY.offset(5.9)):
        Circle(F5_S71_R)
    extrude(amount=F5_T72_DEPTH, both=True, mode=Mode.INTERSECT)


with BuildPart() as f1_6:
    add(f1_5.part)

    # F5_t67: cut F5_tool68
    add(f5_tool68.part, mode=Mode.SUBTRACT)


solid = f1_6.part
